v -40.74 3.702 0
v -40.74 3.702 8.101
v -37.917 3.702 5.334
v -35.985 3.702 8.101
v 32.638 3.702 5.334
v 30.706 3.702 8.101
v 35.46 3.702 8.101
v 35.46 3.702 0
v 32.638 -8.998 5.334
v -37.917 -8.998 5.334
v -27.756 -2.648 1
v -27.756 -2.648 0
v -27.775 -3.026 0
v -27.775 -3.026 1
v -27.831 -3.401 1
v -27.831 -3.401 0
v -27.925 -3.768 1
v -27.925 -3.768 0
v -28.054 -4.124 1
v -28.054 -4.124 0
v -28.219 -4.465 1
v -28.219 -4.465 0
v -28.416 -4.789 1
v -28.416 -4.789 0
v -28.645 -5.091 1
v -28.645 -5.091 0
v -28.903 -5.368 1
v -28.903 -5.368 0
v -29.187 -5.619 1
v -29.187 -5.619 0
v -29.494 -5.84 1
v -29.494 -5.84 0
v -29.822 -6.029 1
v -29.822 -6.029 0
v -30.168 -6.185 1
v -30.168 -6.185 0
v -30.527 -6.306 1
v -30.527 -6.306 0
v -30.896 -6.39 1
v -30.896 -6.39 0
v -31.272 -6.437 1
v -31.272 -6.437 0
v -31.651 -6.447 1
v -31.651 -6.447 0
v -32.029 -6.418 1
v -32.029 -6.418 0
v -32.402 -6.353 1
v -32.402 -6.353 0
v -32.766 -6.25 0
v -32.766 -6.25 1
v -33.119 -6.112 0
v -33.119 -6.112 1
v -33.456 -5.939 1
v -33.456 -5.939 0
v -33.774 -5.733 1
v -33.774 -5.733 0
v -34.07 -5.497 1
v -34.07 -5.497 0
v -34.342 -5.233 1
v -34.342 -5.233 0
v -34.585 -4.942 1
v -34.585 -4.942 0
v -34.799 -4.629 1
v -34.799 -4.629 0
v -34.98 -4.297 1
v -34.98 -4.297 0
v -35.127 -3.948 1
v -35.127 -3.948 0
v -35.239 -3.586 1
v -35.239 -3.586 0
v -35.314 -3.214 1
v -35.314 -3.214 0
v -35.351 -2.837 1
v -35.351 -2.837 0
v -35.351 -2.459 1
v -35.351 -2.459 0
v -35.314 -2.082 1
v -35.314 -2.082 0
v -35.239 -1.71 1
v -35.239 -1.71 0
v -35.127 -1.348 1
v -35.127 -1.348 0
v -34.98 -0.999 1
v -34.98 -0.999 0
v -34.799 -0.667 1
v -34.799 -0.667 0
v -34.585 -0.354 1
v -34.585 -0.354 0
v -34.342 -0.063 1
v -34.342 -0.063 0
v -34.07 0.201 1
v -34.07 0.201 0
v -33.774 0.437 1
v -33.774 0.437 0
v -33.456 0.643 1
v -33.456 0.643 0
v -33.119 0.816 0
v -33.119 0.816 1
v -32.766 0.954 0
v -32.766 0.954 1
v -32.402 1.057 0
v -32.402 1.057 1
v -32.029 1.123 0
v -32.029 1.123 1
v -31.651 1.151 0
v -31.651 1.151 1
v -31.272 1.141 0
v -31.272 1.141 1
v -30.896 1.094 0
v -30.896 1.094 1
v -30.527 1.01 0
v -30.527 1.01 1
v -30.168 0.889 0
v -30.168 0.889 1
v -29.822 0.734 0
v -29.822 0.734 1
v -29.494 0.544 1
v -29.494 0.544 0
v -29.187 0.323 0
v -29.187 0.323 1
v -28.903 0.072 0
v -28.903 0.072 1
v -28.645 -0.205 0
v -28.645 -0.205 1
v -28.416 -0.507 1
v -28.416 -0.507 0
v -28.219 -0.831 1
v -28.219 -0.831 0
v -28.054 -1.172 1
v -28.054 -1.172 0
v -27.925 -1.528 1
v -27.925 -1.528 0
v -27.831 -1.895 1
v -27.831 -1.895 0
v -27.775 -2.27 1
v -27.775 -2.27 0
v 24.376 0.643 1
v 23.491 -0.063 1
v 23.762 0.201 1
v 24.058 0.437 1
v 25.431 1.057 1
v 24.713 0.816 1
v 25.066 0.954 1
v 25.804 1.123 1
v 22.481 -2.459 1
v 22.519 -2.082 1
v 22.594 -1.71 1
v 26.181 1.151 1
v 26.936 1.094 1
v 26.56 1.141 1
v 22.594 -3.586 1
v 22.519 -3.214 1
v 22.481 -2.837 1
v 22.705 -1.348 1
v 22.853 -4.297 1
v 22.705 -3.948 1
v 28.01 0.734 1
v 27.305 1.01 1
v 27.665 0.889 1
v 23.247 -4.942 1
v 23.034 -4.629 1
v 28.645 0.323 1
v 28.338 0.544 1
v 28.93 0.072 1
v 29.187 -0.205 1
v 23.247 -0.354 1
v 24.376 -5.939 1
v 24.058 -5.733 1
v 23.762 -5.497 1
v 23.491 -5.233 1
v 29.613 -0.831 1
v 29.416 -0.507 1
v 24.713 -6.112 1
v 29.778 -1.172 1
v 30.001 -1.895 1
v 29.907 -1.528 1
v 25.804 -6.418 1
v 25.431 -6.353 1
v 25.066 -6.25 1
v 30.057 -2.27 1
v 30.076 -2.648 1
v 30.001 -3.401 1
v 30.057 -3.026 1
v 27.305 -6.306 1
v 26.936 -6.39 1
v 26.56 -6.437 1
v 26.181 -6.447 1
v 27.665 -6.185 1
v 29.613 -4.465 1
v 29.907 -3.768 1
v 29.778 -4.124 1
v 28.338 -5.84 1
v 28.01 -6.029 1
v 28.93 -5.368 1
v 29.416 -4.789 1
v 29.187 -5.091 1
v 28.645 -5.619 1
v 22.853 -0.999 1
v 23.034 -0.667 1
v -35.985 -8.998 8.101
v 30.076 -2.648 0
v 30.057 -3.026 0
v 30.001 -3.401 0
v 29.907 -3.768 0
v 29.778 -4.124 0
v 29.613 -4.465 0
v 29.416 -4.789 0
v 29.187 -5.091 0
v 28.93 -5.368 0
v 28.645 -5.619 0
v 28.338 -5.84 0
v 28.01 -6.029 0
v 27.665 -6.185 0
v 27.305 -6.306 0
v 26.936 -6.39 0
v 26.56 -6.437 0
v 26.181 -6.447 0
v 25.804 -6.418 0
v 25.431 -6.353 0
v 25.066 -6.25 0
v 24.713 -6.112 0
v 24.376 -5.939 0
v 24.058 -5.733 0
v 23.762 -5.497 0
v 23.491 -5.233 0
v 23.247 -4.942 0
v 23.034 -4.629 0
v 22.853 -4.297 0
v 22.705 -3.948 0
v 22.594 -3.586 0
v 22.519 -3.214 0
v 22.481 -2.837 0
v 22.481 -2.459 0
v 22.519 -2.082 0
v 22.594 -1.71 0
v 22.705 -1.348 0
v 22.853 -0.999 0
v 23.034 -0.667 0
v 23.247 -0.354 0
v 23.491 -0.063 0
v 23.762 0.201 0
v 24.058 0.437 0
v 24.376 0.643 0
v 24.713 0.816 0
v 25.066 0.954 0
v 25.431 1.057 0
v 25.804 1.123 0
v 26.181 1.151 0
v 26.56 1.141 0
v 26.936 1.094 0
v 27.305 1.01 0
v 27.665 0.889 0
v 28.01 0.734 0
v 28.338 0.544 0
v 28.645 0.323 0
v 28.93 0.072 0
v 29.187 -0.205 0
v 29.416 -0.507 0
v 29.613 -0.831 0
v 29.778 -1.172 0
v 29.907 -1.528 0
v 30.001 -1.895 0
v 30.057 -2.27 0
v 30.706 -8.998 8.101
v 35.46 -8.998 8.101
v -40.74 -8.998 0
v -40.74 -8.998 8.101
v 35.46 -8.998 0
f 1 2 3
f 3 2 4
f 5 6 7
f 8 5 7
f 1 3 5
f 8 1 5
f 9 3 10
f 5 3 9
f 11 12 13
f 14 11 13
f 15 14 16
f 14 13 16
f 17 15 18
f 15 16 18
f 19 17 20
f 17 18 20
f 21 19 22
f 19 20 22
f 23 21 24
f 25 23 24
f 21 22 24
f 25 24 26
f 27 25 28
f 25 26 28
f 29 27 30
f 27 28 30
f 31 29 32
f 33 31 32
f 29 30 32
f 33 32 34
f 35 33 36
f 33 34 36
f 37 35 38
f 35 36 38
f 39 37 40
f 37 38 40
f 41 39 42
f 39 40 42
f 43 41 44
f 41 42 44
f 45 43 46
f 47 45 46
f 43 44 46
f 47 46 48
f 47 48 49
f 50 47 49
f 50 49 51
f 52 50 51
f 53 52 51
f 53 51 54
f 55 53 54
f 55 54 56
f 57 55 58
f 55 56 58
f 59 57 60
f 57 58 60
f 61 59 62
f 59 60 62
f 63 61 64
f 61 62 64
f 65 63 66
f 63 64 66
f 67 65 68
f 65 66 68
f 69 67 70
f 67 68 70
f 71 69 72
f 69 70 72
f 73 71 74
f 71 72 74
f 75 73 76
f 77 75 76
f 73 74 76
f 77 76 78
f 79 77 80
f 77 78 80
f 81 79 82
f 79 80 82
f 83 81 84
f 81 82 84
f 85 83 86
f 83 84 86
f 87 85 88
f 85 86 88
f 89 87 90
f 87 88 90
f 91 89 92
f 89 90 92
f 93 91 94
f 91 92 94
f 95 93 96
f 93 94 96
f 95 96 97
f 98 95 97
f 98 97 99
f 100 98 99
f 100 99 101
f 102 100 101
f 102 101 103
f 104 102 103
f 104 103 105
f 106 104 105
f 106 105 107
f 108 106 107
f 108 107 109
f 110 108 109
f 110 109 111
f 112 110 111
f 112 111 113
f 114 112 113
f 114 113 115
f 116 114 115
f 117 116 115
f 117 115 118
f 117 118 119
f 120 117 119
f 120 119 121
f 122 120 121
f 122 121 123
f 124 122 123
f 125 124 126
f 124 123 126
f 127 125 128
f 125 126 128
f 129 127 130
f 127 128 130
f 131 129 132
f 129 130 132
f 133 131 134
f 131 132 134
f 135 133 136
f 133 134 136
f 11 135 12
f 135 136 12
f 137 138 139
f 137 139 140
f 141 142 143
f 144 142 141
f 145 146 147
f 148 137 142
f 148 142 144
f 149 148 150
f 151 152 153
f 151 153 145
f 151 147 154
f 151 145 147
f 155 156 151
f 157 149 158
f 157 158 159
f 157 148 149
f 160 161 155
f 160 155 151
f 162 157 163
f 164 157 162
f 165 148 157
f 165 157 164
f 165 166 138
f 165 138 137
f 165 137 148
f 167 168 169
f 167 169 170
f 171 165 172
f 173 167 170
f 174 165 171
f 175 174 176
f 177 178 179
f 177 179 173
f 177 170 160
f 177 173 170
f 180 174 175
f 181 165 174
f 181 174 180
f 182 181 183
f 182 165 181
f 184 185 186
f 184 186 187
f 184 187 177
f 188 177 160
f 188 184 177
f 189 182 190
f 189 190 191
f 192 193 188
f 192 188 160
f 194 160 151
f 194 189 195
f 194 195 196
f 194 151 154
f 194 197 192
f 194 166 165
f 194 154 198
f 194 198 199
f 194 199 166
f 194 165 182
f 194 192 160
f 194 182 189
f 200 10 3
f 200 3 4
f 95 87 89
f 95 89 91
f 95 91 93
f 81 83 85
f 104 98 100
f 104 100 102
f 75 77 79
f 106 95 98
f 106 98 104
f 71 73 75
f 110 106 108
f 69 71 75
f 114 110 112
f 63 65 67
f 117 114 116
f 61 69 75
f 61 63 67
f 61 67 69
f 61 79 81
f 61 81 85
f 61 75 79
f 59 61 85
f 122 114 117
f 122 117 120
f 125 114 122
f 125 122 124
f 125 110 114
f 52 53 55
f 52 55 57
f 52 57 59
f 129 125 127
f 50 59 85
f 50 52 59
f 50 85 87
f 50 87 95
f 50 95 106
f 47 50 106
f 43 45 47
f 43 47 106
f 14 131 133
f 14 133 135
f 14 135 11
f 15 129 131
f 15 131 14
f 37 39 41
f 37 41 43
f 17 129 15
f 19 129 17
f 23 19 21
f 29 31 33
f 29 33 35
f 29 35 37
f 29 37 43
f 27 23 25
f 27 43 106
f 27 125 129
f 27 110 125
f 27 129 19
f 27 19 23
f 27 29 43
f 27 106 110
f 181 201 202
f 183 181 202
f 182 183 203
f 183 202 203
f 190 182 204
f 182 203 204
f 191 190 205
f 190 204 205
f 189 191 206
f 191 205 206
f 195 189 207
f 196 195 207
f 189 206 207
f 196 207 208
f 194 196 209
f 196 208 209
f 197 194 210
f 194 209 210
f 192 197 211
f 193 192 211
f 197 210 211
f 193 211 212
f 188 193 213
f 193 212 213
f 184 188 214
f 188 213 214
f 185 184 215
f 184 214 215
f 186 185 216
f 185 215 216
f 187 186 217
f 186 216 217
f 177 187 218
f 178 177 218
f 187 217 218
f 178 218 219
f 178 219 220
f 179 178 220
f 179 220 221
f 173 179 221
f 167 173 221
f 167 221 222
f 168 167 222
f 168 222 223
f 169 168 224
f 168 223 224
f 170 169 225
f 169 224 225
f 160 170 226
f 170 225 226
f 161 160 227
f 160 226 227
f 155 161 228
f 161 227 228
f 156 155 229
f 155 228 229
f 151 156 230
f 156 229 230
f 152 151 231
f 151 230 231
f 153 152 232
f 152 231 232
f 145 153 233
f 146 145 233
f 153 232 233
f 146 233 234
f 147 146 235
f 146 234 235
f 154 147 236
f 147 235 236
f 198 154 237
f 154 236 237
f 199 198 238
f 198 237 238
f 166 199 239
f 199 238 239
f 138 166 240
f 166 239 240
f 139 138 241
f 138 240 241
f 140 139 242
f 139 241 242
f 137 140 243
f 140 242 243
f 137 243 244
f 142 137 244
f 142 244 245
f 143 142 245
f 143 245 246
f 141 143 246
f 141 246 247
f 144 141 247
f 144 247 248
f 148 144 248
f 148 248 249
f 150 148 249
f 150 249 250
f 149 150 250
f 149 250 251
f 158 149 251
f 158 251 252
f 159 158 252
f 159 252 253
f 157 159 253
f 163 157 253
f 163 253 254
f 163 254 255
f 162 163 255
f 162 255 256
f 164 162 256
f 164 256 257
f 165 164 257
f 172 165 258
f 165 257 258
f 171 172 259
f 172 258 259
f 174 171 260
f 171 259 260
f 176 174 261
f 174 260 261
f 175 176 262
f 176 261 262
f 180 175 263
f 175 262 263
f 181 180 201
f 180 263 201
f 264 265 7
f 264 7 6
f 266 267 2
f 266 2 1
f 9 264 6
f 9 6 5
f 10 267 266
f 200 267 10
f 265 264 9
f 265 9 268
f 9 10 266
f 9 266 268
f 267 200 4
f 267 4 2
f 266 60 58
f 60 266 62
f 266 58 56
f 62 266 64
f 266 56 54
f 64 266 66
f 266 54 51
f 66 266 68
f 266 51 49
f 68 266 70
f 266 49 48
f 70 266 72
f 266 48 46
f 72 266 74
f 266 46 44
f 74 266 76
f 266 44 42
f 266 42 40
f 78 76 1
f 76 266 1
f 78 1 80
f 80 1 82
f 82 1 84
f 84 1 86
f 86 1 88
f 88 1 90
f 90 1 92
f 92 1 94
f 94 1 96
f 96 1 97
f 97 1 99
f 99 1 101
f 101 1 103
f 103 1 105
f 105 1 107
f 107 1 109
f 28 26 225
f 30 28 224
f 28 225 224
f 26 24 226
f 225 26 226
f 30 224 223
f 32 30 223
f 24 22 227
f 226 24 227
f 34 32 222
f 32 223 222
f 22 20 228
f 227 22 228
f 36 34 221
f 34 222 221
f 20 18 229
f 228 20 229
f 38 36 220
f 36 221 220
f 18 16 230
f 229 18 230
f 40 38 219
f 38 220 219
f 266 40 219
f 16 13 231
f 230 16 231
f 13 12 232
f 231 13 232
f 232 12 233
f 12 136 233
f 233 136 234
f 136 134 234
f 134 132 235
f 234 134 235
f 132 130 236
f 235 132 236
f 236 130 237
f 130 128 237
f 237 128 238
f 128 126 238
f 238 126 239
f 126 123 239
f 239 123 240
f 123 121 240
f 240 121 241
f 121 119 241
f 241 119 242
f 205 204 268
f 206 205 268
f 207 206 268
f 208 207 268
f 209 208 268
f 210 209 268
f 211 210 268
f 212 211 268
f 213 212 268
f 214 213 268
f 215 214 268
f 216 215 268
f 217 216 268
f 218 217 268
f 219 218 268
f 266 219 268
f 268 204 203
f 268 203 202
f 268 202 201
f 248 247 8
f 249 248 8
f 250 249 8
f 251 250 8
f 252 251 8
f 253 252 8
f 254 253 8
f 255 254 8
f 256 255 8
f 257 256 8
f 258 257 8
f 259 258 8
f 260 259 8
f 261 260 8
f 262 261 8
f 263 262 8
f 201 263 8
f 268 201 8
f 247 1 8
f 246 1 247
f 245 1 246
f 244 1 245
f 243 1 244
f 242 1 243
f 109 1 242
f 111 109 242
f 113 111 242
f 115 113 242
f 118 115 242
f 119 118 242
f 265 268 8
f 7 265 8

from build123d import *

# Parameters (mm, degrees)
F0_W     = 76.2
F0_H     = 12.7
F1_DEPTH = 5.334
F3_DEPTH = 12.7
F4_R     = 3.8
F5_DEPTH = 1


with BuildPart() as f1:
    # F0 (on Top) → F1 (new body)
    with BuildSketch(Plane.XY):
        with Locations((-2.639927, -2.647982)):
            Rectangle(F0_W, F0_H)
    extrude(amount=F1_DEPTH)

    # F2 (on face) → F3 (join, through all)
    with BuildSketch(Plane.XZ.offset(8.997982)):
        Polygon((-40.739927, 5.334), (-37.917357, 5.334), (-35.98541, 8.101238), (-40.739927, 8.101238), align=None)
        Polygon((30.705556, 8.101238), (32.637503, 5.334), (35.460073, 5.334), (35.460073, 8.101238), align=None)
    extrude(amount=-F3_DEPTH)

    # F4 (on face) → F5 (cut)
    with BuildSketch(Plane(origin=(0, 0, 0), x_dir=(1, 0, 0), z_dir=(0, 0, -1))):
        with Locations((-31.556085, 2.647982)):
            Circle(F4_R)
        with Locations((26.276231, 2.647982)):
            Circle(F4_R)
    extrude(amount=-F5_DEPTH, mode=Mode.SUBTRACT)


solid = f1.part
